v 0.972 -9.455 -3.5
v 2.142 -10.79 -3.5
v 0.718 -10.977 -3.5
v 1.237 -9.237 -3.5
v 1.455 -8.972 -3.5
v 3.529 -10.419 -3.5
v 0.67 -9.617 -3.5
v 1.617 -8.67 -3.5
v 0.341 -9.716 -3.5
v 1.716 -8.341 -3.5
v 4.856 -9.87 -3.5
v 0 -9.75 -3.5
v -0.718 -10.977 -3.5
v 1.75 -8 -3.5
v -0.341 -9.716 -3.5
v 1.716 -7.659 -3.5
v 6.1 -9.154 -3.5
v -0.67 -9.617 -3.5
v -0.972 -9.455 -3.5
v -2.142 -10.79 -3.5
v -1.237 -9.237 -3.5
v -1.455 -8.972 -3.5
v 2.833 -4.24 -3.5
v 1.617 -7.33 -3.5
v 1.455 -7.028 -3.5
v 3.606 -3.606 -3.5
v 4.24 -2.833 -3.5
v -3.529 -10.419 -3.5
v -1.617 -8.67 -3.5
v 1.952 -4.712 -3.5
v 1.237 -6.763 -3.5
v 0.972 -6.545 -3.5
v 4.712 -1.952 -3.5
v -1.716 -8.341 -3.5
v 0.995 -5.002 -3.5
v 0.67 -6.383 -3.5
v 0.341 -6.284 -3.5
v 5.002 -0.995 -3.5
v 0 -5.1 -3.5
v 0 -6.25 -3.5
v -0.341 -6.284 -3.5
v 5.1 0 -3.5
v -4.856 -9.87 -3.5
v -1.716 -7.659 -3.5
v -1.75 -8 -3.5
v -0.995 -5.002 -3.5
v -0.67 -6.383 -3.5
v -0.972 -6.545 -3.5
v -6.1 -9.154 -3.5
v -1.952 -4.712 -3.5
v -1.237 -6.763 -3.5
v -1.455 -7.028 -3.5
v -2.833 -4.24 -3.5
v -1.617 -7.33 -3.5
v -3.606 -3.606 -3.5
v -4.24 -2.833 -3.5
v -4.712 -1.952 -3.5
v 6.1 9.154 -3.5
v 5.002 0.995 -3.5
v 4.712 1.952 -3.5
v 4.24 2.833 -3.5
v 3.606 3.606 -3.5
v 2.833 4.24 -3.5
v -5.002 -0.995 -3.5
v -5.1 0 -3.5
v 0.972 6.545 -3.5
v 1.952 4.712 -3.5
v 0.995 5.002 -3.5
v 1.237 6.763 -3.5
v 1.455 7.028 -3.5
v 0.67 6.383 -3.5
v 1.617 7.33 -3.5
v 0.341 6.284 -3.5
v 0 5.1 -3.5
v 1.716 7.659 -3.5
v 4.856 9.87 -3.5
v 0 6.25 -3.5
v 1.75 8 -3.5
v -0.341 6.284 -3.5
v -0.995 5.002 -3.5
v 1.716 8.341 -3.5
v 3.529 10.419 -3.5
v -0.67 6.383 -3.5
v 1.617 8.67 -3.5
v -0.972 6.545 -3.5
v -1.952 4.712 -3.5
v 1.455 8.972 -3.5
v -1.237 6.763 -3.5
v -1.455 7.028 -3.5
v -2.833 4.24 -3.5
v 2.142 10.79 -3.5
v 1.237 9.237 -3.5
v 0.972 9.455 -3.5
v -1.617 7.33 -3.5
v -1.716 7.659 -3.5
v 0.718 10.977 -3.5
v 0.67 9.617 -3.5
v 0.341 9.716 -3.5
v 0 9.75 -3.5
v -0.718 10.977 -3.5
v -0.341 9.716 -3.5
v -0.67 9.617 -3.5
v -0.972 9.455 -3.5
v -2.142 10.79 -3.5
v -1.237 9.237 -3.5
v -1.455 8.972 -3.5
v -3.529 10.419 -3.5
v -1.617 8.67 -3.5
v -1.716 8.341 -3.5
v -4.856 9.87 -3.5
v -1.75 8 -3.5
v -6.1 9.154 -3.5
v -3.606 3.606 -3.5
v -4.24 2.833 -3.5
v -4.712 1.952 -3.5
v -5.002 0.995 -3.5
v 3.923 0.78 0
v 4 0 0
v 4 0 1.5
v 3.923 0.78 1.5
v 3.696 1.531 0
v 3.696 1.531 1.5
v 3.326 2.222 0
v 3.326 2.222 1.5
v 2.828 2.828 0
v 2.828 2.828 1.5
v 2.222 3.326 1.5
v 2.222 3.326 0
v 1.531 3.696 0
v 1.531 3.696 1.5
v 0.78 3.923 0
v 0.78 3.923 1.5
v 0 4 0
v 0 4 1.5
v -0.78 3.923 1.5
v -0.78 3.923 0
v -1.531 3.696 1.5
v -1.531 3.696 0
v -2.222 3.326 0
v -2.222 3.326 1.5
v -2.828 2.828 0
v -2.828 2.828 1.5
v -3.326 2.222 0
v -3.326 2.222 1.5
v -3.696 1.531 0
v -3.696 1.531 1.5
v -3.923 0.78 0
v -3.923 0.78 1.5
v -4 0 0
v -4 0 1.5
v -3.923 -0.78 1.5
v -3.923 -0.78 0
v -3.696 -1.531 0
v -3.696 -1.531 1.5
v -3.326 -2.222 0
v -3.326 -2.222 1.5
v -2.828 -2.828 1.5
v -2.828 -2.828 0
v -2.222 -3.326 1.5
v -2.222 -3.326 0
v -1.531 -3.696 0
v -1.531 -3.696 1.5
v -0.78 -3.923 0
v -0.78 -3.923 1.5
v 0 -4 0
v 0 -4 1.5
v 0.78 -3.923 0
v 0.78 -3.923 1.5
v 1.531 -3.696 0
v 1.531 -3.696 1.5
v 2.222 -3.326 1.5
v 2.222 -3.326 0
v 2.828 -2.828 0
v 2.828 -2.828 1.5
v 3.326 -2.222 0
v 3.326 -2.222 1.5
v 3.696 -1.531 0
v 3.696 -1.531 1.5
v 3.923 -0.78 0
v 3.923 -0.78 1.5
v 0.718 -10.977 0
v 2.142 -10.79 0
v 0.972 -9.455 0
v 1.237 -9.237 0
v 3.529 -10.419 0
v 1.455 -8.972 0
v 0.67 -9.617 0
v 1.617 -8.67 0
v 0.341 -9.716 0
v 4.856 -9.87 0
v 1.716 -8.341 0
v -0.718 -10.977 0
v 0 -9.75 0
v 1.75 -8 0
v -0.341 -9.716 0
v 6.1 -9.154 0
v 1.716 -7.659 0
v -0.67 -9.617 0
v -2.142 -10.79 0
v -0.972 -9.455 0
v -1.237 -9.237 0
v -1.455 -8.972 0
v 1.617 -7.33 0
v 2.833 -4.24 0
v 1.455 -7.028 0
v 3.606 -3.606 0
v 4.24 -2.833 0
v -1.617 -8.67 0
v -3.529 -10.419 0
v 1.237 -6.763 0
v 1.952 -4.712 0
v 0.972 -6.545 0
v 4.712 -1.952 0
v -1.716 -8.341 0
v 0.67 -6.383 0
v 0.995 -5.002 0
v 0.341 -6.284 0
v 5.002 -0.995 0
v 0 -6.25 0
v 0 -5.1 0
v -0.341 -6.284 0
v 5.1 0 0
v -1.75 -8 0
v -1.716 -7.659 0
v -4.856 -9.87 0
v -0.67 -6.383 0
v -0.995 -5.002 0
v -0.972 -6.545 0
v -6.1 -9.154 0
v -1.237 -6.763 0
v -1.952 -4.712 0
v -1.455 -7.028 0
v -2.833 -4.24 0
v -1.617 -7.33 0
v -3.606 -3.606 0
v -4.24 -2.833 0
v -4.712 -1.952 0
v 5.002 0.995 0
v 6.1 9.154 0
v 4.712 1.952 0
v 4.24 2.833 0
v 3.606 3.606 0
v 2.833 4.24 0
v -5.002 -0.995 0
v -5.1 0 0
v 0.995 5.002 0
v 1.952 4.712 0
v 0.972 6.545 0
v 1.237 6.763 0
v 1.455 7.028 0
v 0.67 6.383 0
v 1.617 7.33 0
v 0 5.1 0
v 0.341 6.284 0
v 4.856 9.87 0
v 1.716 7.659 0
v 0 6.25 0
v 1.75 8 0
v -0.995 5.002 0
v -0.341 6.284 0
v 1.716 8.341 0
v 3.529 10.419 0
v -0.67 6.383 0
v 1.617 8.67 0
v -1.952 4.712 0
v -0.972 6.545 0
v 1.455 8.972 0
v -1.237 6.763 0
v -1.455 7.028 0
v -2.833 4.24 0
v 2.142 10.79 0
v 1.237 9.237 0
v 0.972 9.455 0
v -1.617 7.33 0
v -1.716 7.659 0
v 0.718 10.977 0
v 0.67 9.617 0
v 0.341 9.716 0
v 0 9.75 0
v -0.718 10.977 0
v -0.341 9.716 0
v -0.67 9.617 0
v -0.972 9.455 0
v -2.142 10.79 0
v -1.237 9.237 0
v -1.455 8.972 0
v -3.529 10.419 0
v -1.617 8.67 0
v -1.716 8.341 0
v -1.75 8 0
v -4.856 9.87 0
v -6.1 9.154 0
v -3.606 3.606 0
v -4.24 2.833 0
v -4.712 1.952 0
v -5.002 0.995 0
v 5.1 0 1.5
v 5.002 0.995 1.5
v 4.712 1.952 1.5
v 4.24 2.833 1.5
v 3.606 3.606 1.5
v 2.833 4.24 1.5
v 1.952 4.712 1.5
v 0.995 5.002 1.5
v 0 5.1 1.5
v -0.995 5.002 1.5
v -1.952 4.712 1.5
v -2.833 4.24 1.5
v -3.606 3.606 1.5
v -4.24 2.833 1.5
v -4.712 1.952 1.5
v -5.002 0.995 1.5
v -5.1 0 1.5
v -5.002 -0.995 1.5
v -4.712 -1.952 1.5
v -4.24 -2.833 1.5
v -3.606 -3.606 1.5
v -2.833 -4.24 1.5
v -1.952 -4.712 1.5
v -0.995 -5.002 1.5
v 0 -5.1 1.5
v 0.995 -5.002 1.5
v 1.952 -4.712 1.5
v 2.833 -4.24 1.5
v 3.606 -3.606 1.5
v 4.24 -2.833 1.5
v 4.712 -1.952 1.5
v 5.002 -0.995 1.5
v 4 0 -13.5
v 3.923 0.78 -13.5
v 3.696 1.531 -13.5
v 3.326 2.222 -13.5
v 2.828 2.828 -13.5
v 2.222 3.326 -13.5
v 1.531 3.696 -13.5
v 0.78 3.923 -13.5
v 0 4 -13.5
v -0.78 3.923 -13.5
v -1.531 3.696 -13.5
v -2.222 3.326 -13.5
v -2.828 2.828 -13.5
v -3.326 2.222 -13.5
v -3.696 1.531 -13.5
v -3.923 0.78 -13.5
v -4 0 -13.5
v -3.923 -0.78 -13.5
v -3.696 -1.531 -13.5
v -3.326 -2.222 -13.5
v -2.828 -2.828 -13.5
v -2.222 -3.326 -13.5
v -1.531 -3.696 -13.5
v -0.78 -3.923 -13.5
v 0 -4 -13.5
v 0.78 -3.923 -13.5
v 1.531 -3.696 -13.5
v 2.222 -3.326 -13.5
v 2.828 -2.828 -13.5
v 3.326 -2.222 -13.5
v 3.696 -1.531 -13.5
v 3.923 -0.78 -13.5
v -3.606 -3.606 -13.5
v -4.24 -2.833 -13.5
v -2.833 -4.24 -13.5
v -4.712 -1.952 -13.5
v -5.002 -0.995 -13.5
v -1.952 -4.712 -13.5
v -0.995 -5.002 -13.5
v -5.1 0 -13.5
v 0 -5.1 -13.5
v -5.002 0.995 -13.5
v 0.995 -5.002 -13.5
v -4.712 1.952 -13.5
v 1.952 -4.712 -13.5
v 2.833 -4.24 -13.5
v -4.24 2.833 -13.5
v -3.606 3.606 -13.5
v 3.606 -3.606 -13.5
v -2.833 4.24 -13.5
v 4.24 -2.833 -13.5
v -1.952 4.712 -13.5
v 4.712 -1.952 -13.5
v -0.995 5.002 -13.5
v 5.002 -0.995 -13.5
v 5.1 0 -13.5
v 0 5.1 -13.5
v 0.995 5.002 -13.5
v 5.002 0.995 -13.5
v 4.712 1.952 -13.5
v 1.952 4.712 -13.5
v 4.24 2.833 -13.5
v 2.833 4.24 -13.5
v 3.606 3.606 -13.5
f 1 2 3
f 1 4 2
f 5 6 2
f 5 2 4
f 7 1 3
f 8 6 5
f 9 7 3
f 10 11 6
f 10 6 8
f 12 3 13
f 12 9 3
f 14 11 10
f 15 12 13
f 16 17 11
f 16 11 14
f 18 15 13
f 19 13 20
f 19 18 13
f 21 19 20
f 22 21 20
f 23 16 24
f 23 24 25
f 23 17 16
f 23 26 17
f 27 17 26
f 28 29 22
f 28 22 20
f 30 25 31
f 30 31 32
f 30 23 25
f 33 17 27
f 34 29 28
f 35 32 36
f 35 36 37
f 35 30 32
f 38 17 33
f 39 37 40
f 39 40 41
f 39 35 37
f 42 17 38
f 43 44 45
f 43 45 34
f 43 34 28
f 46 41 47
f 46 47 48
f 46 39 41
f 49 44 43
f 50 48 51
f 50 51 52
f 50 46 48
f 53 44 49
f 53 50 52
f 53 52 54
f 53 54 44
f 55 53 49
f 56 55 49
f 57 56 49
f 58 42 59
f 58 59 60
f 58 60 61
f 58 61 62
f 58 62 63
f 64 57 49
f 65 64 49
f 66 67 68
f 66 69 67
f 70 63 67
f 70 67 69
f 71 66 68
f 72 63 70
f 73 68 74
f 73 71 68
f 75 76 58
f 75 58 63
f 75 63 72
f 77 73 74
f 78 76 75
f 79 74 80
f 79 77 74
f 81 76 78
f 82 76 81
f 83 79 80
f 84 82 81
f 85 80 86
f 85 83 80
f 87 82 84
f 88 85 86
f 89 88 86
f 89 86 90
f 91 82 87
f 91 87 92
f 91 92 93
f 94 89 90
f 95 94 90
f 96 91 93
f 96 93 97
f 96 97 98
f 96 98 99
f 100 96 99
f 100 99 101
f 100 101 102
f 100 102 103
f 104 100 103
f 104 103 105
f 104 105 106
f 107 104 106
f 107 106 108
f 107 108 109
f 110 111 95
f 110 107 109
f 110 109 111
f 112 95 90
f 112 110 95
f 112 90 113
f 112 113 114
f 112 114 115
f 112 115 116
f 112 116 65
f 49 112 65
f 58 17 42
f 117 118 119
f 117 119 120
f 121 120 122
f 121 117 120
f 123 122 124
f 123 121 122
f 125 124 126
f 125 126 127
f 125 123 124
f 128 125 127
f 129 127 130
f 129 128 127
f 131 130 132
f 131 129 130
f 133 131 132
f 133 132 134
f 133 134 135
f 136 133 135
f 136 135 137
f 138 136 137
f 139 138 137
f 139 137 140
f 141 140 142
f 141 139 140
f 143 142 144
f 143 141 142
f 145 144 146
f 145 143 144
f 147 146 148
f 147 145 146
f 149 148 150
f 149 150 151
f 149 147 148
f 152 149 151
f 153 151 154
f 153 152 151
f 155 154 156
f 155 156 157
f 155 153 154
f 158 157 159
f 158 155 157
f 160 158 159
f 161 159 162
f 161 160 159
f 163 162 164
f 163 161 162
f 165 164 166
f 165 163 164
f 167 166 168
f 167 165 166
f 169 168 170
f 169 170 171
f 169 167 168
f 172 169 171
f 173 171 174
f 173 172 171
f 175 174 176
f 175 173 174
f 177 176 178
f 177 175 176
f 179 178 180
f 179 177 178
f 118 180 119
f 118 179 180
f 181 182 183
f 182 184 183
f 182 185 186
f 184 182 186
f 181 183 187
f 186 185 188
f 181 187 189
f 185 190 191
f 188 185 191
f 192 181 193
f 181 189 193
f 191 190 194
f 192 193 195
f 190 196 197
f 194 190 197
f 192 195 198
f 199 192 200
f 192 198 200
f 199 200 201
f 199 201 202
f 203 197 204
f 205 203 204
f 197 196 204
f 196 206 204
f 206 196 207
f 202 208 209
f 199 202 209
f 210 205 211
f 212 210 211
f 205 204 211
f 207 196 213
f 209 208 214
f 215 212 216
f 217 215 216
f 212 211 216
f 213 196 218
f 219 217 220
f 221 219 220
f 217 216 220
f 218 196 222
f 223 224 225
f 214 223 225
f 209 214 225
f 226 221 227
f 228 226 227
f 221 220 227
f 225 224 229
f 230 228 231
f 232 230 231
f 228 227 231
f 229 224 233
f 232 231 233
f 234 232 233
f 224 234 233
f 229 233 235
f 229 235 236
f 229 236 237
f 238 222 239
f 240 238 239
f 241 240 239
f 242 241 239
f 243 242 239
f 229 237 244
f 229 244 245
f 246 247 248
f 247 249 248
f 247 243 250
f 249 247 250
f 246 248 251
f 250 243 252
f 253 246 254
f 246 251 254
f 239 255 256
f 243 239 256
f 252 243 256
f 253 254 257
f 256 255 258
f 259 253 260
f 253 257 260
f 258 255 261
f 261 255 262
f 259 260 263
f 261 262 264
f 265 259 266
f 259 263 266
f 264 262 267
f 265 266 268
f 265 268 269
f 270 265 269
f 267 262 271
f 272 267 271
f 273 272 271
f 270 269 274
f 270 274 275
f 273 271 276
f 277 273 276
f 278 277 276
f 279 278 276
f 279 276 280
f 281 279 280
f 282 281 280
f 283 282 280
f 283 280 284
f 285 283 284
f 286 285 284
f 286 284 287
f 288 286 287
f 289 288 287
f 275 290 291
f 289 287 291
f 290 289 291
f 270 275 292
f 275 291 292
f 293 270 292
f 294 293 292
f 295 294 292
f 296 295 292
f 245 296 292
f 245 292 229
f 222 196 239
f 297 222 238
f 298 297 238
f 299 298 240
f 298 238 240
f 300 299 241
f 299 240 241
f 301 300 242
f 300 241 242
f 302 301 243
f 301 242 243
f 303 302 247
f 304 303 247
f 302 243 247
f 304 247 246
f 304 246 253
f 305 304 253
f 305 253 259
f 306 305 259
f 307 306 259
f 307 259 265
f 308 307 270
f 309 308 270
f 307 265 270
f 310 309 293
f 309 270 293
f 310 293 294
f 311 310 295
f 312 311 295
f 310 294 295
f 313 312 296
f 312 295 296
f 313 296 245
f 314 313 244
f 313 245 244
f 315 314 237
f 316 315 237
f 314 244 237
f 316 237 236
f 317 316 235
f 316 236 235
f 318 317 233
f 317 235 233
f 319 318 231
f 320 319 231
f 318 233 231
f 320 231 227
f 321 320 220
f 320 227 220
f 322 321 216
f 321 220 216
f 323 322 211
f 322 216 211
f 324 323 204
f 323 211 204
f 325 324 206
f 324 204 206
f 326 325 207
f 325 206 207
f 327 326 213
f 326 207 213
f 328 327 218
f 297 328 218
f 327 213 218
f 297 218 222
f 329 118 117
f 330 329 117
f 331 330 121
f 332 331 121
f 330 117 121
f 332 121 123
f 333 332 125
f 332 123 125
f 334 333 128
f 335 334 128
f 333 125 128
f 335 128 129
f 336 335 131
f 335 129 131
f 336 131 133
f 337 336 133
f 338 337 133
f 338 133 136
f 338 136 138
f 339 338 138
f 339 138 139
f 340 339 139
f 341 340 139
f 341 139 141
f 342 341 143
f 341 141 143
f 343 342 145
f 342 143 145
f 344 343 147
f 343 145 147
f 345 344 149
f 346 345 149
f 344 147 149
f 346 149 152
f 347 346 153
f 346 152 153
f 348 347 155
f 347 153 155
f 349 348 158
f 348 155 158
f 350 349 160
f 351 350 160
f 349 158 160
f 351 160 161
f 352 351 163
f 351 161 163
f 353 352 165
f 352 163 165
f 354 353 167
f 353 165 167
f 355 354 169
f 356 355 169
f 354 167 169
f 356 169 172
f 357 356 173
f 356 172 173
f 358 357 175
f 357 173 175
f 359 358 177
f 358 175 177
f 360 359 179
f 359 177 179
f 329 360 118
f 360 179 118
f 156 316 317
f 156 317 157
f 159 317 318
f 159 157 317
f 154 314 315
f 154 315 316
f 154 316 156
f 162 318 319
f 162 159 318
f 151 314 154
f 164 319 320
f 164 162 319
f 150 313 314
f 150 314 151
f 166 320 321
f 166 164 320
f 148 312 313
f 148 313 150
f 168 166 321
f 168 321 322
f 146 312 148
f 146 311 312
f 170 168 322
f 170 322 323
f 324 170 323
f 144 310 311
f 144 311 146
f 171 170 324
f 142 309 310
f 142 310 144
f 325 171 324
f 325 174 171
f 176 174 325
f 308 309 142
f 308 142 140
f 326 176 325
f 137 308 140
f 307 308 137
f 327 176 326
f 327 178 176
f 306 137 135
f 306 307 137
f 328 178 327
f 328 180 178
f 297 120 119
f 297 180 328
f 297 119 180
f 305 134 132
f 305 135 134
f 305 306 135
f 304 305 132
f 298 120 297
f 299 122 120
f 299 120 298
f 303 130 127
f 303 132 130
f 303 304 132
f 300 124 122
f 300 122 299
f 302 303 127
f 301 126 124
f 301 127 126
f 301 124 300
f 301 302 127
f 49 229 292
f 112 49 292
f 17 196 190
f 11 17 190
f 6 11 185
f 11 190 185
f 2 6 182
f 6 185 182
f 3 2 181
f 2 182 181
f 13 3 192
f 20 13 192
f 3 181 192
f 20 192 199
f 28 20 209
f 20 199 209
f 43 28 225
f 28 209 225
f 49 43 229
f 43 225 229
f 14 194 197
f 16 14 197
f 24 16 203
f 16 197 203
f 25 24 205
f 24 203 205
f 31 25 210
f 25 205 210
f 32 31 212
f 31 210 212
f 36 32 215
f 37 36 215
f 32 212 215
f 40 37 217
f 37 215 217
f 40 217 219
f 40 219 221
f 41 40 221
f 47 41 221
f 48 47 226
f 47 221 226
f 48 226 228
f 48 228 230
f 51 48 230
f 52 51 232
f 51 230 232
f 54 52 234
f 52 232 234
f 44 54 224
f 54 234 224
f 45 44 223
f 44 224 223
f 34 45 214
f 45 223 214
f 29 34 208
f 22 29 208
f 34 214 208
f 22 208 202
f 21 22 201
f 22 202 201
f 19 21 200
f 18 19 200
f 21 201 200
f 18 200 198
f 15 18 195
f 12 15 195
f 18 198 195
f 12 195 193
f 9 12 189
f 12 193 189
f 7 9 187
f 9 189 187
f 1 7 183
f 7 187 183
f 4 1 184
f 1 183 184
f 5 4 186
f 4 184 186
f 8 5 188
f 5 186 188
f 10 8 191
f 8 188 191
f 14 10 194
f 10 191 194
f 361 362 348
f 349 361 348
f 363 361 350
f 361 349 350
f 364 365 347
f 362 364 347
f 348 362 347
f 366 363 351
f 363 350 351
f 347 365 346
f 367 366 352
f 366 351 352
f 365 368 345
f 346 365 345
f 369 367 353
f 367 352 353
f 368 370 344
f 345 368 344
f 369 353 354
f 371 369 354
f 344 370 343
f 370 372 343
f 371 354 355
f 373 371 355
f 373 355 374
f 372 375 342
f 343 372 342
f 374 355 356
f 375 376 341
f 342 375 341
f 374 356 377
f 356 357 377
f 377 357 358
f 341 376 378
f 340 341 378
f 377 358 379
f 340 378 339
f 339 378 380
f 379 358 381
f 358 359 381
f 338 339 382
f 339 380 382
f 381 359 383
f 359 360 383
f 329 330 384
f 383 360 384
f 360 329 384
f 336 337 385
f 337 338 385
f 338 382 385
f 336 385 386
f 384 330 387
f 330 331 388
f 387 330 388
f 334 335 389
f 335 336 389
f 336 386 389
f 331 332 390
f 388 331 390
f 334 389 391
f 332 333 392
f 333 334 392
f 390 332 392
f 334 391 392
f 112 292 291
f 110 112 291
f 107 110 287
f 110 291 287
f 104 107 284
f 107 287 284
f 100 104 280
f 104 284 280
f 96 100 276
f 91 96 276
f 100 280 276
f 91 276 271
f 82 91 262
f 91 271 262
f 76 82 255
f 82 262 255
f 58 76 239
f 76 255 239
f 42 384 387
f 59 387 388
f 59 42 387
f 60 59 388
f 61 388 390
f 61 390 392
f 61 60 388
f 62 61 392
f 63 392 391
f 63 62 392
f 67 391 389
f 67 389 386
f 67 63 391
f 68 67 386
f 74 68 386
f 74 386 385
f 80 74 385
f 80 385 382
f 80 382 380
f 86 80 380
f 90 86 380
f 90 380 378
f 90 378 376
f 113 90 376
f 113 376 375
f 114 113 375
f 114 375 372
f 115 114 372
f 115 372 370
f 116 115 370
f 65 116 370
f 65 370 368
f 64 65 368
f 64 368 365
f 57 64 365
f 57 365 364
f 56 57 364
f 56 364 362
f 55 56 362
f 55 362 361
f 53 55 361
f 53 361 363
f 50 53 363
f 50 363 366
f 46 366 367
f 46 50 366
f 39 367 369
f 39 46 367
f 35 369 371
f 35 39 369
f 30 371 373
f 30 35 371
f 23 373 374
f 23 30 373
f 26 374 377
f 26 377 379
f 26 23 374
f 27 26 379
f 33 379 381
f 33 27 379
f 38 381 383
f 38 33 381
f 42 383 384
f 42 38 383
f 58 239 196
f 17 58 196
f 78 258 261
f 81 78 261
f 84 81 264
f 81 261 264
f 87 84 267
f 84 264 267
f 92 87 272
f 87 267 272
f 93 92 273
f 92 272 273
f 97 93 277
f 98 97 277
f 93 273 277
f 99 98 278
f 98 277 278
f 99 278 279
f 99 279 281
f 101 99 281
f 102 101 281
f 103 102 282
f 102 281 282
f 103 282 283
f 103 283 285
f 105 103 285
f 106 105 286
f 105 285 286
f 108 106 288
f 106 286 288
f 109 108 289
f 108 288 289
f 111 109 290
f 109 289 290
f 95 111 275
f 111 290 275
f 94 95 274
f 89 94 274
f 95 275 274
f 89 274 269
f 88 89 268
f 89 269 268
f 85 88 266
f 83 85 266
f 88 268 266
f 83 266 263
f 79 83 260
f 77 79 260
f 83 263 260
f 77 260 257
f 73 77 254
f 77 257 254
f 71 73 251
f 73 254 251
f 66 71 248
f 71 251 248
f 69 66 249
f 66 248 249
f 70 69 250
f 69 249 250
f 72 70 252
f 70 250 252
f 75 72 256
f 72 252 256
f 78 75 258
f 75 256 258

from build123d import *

# Parameters (mm, degrees)
SKETCH1_R                = 5.1
SKETCH1_R_2              = 1.75
BOSS_EXTRUDE1_DEPTH      = 3.5
SKETCH2_R                = 5.1
SKETCH2_R_2              = 4
BOSS_EXTRUDE2_DEPTH      = 1.5
BOSS_EXTRUDE2_DEPTH_BACK = 13.5


with BuildPart() as part:
    # Sketch1 → Boss-Extrude1 (new body)
    with BuildSketch(Plane.XY):
        with BuildLine():
            Line((-6.1, -9.153687781), (-6.1, 9.153687781))
            ThreePointArc((-6.1, 9.153687781), (0, 11), (6.1, 9.153687781))
            Line((6.1, 9.153687781), (6.1, -9.153687781))
            ThreePointArc((6.1, -9.153687781), (0, -11), (-6.1, -9.153687781))
        make_face()
        Circle(SKETCH1_R, mode=Mode.SUBTRACT)
        with Locations((0, 8)):
            Circle(SKETCH1_R_2, mode=Mode.SUBTRACT)
        with Locations((0, -8)):
            Circle(SKETCH1_R_2, mode=Mode.SUBTRACT)
    extrude(amount=-BOSS_EXTRUDE1_DEPTH)

    # Sketch2 → Boss-Extrude2 (add, two sides)
    with BuildSketch(Plane.XY) as boss_extrude2_sk:
        Circle(SKETCH2_R)
        Circle(SKETCH2_R_2, mode=Mode.SUBTRACT)
    extrude(amount=BOSS_EXTRUDE2_DEPTH)
    extrude(boss_extrude2_sk.sketch, amount=-BOSS_EXTRUDE2_DEPTH_BACK)


solid = part.part
